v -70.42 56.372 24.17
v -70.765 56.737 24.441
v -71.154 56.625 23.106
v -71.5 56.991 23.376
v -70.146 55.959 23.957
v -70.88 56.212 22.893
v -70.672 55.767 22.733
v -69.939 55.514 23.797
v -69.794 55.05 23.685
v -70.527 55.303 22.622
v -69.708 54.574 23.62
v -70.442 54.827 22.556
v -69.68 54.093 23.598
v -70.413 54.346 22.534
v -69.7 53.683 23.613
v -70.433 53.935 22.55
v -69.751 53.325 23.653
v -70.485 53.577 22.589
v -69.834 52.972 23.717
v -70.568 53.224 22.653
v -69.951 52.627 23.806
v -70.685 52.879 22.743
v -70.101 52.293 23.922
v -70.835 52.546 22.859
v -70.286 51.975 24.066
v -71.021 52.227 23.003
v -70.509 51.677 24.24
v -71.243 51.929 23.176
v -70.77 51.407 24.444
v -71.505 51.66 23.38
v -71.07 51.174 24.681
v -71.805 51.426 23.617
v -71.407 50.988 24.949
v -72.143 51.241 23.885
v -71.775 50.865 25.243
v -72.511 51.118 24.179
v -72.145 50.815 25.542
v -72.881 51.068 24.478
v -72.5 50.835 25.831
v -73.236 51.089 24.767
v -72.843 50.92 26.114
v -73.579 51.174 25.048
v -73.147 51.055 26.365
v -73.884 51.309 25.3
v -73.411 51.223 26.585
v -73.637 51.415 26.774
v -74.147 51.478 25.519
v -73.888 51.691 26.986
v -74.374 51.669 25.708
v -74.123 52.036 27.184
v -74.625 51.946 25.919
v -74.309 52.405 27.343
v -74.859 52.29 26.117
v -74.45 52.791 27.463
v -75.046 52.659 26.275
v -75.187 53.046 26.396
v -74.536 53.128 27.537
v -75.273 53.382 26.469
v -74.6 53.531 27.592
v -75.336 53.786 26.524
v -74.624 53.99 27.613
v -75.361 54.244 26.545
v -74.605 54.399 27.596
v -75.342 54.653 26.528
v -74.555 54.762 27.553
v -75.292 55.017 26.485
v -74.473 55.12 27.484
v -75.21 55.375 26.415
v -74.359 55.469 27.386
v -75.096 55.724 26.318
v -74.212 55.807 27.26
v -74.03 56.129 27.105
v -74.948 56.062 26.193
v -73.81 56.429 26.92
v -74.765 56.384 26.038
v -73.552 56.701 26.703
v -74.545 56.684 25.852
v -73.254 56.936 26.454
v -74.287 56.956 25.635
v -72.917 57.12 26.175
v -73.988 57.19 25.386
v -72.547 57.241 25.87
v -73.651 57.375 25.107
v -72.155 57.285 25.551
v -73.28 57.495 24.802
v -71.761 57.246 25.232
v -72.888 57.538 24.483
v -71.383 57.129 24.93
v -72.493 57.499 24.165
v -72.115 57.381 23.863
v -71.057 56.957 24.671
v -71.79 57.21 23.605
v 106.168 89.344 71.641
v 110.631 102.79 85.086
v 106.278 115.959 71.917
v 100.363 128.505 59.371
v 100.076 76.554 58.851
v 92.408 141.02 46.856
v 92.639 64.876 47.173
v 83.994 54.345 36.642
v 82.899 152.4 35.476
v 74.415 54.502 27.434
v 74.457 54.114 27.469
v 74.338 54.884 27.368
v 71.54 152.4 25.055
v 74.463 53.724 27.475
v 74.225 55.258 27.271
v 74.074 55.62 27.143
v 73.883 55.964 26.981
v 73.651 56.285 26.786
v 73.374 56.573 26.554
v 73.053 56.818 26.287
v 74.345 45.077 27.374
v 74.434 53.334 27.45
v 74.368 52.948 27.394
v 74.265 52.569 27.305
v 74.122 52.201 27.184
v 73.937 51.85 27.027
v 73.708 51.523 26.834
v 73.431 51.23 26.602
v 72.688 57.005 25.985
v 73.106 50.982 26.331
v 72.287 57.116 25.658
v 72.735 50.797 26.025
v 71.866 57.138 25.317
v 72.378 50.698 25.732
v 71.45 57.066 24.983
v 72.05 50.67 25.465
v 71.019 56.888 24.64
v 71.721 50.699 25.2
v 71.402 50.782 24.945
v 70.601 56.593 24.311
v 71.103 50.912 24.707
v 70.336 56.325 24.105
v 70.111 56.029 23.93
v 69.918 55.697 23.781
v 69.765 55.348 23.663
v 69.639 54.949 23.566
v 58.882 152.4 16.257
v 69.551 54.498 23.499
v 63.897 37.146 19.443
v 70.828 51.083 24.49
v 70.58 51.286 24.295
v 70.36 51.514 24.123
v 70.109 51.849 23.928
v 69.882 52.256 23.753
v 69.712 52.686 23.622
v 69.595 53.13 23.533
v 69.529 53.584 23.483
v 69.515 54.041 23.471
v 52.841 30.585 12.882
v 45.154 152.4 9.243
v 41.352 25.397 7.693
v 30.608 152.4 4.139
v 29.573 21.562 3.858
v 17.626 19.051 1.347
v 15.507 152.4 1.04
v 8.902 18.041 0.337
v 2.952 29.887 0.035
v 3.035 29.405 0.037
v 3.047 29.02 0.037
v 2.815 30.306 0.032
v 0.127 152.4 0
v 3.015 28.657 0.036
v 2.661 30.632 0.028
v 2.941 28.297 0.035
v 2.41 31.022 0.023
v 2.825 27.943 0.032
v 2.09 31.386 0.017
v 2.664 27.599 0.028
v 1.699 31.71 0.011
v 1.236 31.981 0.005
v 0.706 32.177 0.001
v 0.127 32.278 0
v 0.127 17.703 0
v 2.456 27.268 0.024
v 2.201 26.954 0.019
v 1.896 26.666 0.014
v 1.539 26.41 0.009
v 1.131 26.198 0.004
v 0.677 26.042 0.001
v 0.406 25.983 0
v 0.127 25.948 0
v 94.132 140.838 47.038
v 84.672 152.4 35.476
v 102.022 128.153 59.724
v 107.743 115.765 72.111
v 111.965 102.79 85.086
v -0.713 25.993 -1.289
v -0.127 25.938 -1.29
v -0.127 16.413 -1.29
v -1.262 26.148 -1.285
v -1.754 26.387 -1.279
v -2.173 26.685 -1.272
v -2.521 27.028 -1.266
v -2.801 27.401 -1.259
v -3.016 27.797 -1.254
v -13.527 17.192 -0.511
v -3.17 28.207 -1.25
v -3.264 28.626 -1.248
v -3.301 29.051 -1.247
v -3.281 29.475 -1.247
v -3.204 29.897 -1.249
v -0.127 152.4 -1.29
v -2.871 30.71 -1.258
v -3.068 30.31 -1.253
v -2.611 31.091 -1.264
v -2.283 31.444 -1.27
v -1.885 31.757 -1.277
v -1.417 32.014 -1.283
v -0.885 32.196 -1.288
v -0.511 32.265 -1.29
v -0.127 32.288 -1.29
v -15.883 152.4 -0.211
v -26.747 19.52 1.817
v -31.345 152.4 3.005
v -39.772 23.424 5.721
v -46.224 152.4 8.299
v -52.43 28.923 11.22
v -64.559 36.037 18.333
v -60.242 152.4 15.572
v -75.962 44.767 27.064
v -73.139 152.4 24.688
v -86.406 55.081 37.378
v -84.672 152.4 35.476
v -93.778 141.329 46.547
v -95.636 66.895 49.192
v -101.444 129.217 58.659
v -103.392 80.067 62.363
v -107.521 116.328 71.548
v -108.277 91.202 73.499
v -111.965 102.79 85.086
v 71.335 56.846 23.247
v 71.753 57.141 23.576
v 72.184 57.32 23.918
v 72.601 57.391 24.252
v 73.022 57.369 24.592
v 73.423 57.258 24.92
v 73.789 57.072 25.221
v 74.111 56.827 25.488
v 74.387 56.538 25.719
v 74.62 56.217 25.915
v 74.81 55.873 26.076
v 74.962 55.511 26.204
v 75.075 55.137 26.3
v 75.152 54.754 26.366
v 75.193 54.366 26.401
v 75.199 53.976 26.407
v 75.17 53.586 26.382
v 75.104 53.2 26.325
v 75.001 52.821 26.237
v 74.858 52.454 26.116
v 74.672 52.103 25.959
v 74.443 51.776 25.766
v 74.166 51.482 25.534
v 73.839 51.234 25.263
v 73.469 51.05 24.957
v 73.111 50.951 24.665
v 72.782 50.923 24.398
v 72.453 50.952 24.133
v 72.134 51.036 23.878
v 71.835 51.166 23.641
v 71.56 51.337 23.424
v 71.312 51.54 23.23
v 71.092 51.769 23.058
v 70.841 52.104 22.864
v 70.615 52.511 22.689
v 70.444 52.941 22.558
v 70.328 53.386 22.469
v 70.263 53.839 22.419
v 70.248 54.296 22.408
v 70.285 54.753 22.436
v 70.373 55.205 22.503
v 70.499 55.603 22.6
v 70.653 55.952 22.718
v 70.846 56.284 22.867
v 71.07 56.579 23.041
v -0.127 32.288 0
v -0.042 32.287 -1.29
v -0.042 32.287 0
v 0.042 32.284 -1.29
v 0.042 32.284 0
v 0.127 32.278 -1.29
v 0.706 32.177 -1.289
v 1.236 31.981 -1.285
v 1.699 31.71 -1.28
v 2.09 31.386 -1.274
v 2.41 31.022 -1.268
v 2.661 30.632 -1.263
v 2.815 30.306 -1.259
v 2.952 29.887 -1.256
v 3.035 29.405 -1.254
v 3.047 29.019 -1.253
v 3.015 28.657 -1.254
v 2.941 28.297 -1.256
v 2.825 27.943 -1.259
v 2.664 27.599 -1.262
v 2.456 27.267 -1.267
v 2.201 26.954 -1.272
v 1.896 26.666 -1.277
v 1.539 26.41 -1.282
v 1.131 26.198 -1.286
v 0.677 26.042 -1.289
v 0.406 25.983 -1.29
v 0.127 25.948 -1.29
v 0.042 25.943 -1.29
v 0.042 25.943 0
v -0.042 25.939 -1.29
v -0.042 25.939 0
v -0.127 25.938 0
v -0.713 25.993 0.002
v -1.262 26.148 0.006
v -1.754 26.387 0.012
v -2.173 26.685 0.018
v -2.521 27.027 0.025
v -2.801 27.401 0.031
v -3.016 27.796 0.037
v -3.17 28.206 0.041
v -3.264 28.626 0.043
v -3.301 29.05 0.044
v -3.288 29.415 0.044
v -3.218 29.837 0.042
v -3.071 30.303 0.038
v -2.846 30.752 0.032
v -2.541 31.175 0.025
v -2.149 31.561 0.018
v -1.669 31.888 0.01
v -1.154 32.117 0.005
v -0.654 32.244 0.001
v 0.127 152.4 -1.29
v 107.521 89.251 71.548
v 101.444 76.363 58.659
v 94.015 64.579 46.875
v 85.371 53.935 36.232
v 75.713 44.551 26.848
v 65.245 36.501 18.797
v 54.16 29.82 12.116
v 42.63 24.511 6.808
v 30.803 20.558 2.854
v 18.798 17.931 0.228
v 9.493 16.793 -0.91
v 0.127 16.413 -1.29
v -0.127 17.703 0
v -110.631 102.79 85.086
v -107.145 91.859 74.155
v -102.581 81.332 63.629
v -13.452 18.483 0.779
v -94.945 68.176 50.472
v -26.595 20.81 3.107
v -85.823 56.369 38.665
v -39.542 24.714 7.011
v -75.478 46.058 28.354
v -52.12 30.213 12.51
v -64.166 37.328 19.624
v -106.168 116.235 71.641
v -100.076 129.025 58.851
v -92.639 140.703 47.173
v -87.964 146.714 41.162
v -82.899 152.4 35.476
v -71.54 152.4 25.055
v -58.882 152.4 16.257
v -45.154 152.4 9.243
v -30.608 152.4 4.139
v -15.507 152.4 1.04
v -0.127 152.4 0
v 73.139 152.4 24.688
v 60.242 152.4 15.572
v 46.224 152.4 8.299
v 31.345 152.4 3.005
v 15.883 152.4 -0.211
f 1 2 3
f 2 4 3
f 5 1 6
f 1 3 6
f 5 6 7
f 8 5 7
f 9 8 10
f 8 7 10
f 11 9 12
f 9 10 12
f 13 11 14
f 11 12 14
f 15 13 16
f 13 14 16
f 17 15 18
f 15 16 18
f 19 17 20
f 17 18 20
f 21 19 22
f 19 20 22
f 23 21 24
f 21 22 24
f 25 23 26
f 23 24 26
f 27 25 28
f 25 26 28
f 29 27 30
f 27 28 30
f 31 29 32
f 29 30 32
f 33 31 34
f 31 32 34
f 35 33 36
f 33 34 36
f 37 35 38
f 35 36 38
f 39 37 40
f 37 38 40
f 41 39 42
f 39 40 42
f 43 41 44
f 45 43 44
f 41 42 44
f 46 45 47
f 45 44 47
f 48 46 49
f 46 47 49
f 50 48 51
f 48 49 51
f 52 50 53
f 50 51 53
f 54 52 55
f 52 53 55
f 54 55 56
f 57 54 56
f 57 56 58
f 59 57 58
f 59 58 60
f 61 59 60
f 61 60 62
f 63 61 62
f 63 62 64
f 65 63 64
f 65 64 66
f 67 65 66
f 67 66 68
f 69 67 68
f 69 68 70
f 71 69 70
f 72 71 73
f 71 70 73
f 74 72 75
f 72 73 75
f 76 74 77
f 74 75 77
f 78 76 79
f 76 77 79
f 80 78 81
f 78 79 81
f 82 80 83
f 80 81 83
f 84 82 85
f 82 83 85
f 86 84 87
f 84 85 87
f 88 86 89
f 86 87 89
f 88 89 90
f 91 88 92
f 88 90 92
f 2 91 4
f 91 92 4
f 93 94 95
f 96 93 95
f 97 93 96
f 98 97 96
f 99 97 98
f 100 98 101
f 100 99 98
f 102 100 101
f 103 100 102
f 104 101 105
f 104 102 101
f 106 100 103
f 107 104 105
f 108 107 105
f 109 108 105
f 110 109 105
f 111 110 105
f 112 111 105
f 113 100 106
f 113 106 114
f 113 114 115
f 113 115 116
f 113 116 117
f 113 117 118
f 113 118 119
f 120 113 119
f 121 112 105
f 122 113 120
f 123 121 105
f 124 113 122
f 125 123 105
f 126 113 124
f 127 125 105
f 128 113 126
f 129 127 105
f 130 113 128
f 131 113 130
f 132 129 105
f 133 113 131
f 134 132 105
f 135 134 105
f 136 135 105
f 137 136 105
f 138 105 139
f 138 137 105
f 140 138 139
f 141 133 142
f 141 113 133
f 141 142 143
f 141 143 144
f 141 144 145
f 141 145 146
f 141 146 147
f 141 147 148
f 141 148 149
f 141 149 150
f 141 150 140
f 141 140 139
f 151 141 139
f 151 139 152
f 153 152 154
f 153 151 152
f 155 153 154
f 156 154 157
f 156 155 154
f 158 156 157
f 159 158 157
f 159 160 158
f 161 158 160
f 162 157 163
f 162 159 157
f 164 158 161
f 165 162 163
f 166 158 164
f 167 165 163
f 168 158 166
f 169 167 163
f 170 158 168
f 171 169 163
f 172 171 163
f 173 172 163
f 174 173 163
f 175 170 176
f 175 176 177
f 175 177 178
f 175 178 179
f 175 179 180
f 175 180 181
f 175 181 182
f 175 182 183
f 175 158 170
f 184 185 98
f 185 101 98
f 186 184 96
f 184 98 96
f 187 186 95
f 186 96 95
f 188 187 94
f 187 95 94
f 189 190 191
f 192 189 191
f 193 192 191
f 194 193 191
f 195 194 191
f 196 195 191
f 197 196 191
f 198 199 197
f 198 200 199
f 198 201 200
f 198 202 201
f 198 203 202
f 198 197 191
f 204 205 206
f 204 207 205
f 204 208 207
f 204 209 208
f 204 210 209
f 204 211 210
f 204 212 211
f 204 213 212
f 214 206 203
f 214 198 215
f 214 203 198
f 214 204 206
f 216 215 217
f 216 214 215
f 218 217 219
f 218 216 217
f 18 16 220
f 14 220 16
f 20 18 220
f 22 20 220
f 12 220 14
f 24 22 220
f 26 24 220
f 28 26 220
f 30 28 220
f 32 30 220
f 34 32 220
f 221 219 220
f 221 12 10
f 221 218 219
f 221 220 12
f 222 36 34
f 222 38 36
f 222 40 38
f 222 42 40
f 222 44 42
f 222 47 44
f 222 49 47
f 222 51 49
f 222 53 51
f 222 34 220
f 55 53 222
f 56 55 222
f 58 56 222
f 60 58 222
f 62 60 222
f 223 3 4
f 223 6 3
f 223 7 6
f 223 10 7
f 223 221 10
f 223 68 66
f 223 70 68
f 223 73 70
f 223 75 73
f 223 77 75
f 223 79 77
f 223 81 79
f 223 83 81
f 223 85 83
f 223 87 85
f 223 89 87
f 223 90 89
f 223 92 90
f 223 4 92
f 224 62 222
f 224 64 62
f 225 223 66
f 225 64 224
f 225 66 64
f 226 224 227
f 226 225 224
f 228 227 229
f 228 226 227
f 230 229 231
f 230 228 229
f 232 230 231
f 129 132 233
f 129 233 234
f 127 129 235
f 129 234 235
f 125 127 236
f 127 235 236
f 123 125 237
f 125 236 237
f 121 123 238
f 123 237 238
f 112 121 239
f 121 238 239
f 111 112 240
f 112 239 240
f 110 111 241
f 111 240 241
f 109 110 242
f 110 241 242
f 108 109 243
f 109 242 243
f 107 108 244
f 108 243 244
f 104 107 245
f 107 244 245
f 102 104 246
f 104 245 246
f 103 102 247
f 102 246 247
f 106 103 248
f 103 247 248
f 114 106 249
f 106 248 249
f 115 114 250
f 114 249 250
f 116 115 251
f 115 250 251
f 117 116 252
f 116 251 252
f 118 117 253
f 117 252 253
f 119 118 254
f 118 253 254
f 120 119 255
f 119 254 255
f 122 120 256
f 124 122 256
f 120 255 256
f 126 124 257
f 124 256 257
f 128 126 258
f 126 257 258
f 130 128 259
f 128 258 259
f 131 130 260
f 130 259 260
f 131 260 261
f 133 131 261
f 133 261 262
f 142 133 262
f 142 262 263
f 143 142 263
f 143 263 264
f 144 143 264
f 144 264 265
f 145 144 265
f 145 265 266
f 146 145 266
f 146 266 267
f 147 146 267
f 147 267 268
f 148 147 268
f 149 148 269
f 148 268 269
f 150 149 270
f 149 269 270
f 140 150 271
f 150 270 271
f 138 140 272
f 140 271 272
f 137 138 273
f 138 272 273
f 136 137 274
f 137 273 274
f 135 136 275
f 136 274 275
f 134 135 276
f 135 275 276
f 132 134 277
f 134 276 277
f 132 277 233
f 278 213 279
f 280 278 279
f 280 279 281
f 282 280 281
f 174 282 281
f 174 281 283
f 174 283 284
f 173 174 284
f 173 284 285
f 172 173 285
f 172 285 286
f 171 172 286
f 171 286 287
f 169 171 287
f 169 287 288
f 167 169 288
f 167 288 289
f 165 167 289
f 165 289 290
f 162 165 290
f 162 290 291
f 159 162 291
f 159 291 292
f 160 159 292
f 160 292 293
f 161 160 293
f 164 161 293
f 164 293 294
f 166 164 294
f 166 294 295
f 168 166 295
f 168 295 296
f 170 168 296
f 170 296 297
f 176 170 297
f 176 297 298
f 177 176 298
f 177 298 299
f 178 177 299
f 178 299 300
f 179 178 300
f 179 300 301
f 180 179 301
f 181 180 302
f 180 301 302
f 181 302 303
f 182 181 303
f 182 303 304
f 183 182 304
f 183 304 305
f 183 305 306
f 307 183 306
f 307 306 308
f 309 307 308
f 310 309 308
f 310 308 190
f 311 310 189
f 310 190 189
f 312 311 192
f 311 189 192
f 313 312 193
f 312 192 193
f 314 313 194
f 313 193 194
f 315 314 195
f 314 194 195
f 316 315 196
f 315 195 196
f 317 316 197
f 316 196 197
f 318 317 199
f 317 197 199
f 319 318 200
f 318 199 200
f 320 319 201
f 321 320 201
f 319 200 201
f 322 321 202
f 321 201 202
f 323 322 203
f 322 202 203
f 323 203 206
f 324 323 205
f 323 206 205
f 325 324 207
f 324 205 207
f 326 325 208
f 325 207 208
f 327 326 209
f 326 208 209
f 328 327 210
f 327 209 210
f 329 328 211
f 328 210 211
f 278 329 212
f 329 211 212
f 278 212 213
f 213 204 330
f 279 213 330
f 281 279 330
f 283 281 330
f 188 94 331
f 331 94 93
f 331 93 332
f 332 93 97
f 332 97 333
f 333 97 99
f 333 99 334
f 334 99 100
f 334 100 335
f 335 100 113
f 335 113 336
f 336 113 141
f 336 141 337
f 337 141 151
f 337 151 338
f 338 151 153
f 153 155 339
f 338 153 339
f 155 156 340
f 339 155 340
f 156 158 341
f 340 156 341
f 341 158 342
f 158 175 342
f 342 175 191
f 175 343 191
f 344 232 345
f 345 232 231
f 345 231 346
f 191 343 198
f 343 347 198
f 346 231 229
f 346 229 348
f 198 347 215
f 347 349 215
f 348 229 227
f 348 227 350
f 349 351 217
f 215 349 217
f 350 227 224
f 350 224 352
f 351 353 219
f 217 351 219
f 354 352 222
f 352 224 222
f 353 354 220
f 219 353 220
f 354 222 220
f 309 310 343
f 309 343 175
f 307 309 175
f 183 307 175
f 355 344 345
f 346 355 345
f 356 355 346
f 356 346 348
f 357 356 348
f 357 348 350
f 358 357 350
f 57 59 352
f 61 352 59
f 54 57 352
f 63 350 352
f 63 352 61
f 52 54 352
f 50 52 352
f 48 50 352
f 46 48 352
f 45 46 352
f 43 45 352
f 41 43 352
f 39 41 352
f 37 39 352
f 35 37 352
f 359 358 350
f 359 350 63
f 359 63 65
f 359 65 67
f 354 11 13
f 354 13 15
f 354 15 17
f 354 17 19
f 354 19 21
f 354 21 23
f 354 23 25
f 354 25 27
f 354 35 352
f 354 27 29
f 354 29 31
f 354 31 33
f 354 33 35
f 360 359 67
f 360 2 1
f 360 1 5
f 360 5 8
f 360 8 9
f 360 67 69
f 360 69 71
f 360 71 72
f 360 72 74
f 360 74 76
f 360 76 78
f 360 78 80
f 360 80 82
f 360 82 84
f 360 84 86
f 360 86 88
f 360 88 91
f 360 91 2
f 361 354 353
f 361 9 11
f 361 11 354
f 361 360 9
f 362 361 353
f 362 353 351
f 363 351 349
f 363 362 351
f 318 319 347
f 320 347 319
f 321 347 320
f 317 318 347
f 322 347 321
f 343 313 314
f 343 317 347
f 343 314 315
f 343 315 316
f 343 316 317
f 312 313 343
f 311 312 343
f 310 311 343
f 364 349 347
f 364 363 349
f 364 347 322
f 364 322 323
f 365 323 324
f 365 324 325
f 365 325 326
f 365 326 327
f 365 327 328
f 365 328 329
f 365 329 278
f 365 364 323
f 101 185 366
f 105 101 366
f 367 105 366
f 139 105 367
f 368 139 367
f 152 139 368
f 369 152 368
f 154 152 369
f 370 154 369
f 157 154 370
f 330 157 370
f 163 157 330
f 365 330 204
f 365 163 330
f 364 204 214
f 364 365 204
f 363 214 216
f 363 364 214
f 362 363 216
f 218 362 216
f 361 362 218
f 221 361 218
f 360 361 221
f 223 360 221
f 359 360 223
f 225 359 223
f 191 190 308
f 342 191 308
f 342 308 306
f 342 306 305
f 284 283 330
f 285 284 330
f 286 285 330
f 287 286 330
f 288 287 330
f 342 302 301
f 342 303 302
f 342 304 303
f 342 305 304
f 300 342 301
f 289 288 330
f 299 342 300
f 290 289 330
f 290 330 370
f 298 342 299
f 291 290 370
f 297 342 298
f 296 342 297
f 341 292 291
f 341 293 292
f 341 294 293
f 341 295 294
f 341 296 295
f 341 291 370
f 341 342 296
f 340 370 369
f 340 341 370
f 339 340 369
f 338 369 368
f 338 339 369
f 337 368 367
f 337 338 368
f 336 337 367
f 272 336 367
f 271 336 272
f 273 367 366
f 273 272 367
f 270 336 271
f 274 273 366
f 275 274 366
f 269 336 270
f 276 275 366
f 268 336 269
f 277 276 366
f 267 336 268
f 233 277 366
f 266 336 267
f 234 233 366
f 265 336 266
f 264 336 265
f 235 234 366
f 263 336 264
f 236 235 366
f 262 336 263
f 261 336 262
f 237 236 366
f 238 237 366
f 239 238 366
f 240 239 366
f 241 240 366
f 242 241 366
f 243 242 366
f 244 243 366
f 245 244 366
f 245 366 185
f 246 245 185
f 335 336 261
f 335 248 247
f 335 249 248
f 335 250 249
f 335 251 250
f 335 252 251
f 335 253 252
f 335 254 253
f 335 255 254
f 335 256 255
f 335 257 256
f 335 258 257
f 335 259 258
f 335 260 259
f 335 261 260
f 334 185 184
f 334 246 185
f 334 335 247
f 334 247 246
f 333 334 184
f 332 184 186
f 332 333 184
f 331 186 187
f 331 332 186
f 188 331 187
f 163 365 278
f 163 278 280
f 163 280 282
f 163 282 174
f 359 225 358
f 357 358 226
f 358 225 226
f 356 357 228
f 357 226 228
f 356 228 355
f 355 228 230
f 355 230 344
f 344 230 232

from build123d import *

# Parameters (mm, degrees)
SKETCH1_W                       = 0.254
SKETCH1_H                       = 152.4
BASE_FLANGE1_DEPTH              = 1.29032
EDGE_FLANGE1_DEPTH              = 152.4
EDGE_FLANGE1_BEND_DEPTH         = 152.4
CUT_EXTRUDE6_DEPTH              = 229.952357039
CUT_EXTRUDE6_DEPTH_BACK         = 229.952357039
SKETCH15_R                      = 3.175
CUT_EXTRUDE7_DEPTH              = 208.900927137
CIRPATTERN2_COUNT               = 2
CIRPATTERN2_ANGLE               = 52
CIRPATTERN2_THE_OTHER_WAY_COUNT = 2
CIRPATTERN2_THE_OTHER_WAY_ANGLE = 52


# Sheet-metal steps are written as plain solids
with BuildPart() as part:
    # Sketch1 → Base-Flange1 (new body)
    with BuildSketch(Plane.XY):
        with Locations((0, 76.2)):
            Rectangle(SKETCH1_W, SKETCH1_H)
    extrude(amount=-BASE_FLANGE1_DEPTH)

    # Edge-Flange1 section (across the edge) → Edge-Flange1 (add)
    with BuildSketch(Plane(origin=(114.427, 0, 0), x_dir=(-1, 0, 0), z_dir=(0, 1, 0))):
        with BuildLine():
            Line((-1.29032, 114.3), (-1.29032, 125.70968))
            Line((-1.29032, 125.70968), (0, 125.70968))
            Line((0, 125.70968), (0, 114.3))
            ThreePointArc((0, 114.3), (33.47769491, 33.47769491), (114.3, 0))
            Line((114.3, 0), (114.3, -1.29032))
            ThreePointArc((114.3, -1.29032), (32.565300888, 32.565300888), (-1.29032, 114.3))
        make_face()
    extrude(amount=EDGE_FLANGE1_DEPTH)

    # Edge-Flange1 section 2 (across the edge) → Edge-Flange1 bend (add)
    with BuildSketch(Plane(origin=(-114.427, 152.4, 0), x_dir=(1, 0, 0), z_dir=(0, -1, 0))):
        with BuildLine():
            Line((-1.29032, 114.3), (-1.29032, 125.70968))
            Line((-1.29032, 125.70968), (0, 125.70968))
            Line((0, 125.70968), (0, 114.3))
            ThreePointArc((0, 114.3), (33.47769491, 33.47769491), (114.3, 0))
            Line((114.3, 0), (114.3, -1.29032))
            ThreePointArc((114.3, -1.29032), (32.565300888, 32.565300888), (-1.29032, 114.3))
        make_face()
    extrude(amount=EDGE_FLANGE1_BEND_DEPTH)

    # Sketch14 → Cut-Extrude6 (cut, two sides: drawn at the far end of the back side and taken through both)
    with BuildSketch(Plane(origin=(0, 0, 0), x_dir=(0, 0, -1), z_dir=(1, 0, 0)).offset(-CUT_EXTRUDE6_DEPTH_BACK)):
        Polygon((-85.086344518, 102.789769459), (40.691860392, -22.988435452), (-72.437884386, -136.118180231), (-256.114134731, 47.558070115), (-142.984389953, 160.687814893), (-68.759425458, 243.273840802), (-6.680849316, 181.19526466), align=None)
    extrude(amount=CUT_EXTRUDE6_DEPTH + CUT_EXTRUDE6_DEPTH_BACK, mode=Mode.SUBTRACT)

    # Sketch15 → Cut-Extrude7 (cut, symmetric)
    with BuildSketch(Plane(origin=(0, 0, -1.29032), x_dir=(-1, 0, 0), z_dir=(0, 0, -1))):
        with Locations(Location((0.127, 29.11310494, 0), (0, 0, 90))):
            Circle(SKETCH15_R)
    cut_extrude7 = extrude(amount=CUT_EXTRUDE7_DEPTH, both=True, mode=Mode.SUBTRACT)

    # CirPattern2: Cut-Extrude7 ×2 about axis
    cirpattern2_axis = Axis((0, 79.569647195, 79.569647195), (0, 0.707106781186544, -0.7071067811865511))
    for i in range(1, CIRPATTERN2_COUNT):
        add(cut_extrude7.rotate(cirpattern2_axis, i * CIRPATTERN2_ANGLE / (CIRPATTERN2_COUNT - 1)), mode=Mode.SUBTRACT)

    # CirPattern2 the other way: Cut-Extrude7 ×2 about axis
    cirpattern2_the_other_way_axis = Axis((0, 79.569647195, 79.569647195), (0, -0.707106781186544, 0.7071067811865511))
    for i in range(1, CIRPATTERN2_THE_OTHER_WAY_COUNT):
        add(cut_extrude7.rotate(cirpattern2_the_other_way_axis, i * CIRPATTERN2_THE_OTHER_WAY_ANGLE / (CIRPATTERN2_THE_OTHER_WAY_COUNT - 1)), mode=Mode.SUBTRACT)


solid = part.part
